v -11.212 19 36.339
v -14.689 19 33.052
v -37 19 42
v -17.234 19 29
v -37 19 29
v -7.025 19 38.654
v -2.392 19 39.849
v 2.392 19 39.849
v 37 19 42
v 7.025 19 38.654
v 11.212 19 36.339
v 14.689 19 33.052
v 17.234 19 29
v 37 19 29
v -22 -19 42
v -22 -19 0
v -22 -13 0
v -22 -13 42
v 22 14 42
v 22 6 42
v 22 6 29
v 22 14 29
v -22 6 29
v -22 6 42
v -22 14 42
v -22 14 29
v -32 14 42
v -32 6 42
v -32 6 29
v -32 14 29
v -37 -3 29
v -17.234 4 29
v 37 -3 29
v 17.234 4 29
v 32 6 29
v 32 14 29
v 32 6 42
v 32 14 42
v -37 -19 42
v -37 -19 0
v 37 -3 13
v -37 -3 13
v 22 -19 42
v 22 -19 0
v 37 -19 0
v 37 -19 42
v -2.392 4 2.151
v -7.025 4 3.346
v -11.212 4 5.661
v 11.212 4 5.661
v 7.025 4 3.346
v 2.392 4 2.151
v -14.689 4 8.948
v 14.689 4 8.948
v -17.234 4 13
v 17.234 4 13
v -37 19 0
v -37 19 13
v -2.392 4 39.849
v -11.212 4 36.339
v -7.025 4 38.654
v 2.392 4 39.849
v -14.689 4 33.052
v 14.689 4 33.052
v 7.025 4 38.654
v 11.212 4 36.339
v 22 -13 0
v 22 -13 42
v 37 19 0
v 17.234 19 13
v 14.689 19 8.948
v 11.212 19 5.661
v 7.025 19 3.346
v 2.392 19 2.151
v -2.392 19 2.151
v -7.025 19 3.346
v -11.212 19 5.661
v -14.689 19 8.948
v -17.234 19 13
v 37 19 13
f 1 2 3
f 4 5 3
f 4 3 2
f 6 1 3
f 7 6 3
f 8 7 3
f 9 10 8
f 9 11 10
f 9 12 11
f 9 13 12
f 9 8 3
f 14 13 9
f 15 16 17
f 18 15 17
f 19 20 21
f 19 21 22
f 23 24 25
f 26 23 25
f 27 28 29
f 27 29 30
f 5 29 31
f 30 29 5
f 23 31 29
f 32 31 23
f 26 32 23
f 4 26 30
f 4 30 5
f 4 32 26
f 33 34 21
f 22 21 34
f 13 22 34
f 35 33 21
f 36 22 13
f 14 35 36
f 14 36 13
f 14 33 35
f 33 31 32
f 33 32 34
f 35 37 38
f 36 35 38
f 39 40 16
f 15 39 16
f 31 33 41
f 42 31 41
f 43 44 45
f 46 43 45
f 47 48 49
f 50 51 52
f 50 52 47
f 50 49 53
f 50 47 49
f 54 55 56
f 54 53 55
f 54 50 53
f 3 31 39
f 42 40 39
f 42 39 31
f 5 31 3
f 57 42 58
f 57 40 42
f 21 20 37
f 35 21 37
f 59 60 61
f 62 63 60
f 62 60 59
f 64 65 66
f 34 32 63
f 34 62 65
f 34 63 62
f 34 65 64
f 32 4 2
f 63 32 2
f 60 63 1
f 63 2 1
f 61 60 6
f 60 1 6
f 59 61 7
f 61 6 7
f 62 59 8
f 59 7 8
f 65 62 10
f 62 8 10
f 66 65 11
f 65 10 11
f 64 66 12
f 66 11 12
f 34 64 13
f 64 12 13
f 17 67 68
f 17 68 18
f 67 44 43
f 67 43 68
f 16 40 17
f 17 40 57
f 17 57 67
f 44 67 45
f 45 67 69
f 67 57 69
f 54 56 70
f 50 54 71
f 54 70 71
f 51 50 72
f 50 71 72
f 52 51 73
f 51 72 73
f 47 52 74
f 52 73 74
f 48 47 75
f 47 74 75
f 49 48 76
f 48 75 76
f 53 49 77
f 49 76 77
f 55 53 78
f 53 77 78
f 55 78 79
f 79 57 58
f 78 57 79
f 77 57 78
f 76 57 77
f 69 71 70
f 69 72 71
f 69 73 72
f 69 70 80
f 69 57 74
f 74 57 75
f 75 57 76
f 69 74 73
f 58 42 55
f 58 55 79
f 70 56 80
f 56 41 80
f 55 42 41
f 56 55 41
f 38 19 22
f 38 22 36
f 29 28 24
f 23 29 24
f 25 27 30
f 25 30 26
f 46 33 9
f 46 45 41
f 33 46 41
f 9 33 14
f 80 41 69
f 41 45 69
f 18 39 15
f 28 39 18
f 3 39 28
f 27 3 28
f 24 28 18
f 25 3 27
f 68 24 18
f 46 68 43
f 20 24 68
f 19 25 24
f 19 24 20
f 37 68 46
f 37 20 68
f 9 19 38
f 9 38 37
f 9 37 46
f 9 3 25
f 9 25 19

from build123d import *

# Parameters (mm, degrees)
SKETCH1_W           = 74
SKETCH1_H           = 38
BOSS_EXTRUDE1_DEPTH = 42
SKETCH2_W           = 44
SKETCH2_H           = 6
CUT_EXTRUDE1_DEPTH  = 42
SKETCH3_W           = 16
SKETCH3_H           = 22
CUT_EXTRUDE2_DEPTH  = 74
SKETCH4_R           = 19
CUT_EXTRUDE3_DEPTH  = 15
SKETCH5_W           = 10
SKETCH5_H           = 8
CUT_EXTRUDE4_DEPTH  = 15


with BuildPart() as part:
    # Sketch1 → Boss-Extrude1 (new body)
    with BuildSketch(Plane.XY):
        Rectangle(SKETCH1_W, SKETCH1_H)
    extrude(amount=BOSS_EXTRUDE1_DEPTH)

    # Sketch2 → Cut-Extrude1 (cut)
    with BuildSketch(Plane(origin=(0, 0, 0), x_dir=(-1, 0, 0), z_dir=(0, 0, -1))):
        with Locations((0, -16)):
            Rectangle(SKETCH2_W, SKETCH2_H)
    extrude(amount=-CUT_EXTRUDE1_DEPTH, mode=Mode.SUBTRACT)

    # Sketch3 → Cut-Extrude2 (cut)
    with BuildSketch(Plane(origin=(37, 0, 0), x_dir=(0, 0, -1), z_dir=(1, 0, 0))):
        with Locations((-21, 8)):
            Rectangle(SKETCH3_W, SKETCH3_H)
    extrude(amount=-CUT_EXTRUDE2_DEPTH, mode=Mode.SUBTRACT)

    # Sketch4 → Cut-Extrude3 (cut)
    with BuildSketch(Plane(origin=(0, 19, 0), x_dir=(1, 0, 0), z_dir=(0, 1, 0))):
        with Locations((0, -21)):
            Circle(SKETCH4_R)
    extrude(amount=-CUT_EXTRUDE3_DEPTH, mode=Mode.SUBTRACT)

    # Sketch5 → Cut-Extrude4 (cut)
    with BuildSketch(Plane.XY.offset(42)):
        with Locations((-27, 10)):
            Rectangle(SKETCH5_W, SKETCH5_H)
        with Locations((27, 10)):
            Rectangle(SKETCH5_W, SKETCH5_H)
    extrude(amount=-CUT_EXTRUDE4_DEPTH, mode=Mode.SUBTRACT)


solid = part.part
